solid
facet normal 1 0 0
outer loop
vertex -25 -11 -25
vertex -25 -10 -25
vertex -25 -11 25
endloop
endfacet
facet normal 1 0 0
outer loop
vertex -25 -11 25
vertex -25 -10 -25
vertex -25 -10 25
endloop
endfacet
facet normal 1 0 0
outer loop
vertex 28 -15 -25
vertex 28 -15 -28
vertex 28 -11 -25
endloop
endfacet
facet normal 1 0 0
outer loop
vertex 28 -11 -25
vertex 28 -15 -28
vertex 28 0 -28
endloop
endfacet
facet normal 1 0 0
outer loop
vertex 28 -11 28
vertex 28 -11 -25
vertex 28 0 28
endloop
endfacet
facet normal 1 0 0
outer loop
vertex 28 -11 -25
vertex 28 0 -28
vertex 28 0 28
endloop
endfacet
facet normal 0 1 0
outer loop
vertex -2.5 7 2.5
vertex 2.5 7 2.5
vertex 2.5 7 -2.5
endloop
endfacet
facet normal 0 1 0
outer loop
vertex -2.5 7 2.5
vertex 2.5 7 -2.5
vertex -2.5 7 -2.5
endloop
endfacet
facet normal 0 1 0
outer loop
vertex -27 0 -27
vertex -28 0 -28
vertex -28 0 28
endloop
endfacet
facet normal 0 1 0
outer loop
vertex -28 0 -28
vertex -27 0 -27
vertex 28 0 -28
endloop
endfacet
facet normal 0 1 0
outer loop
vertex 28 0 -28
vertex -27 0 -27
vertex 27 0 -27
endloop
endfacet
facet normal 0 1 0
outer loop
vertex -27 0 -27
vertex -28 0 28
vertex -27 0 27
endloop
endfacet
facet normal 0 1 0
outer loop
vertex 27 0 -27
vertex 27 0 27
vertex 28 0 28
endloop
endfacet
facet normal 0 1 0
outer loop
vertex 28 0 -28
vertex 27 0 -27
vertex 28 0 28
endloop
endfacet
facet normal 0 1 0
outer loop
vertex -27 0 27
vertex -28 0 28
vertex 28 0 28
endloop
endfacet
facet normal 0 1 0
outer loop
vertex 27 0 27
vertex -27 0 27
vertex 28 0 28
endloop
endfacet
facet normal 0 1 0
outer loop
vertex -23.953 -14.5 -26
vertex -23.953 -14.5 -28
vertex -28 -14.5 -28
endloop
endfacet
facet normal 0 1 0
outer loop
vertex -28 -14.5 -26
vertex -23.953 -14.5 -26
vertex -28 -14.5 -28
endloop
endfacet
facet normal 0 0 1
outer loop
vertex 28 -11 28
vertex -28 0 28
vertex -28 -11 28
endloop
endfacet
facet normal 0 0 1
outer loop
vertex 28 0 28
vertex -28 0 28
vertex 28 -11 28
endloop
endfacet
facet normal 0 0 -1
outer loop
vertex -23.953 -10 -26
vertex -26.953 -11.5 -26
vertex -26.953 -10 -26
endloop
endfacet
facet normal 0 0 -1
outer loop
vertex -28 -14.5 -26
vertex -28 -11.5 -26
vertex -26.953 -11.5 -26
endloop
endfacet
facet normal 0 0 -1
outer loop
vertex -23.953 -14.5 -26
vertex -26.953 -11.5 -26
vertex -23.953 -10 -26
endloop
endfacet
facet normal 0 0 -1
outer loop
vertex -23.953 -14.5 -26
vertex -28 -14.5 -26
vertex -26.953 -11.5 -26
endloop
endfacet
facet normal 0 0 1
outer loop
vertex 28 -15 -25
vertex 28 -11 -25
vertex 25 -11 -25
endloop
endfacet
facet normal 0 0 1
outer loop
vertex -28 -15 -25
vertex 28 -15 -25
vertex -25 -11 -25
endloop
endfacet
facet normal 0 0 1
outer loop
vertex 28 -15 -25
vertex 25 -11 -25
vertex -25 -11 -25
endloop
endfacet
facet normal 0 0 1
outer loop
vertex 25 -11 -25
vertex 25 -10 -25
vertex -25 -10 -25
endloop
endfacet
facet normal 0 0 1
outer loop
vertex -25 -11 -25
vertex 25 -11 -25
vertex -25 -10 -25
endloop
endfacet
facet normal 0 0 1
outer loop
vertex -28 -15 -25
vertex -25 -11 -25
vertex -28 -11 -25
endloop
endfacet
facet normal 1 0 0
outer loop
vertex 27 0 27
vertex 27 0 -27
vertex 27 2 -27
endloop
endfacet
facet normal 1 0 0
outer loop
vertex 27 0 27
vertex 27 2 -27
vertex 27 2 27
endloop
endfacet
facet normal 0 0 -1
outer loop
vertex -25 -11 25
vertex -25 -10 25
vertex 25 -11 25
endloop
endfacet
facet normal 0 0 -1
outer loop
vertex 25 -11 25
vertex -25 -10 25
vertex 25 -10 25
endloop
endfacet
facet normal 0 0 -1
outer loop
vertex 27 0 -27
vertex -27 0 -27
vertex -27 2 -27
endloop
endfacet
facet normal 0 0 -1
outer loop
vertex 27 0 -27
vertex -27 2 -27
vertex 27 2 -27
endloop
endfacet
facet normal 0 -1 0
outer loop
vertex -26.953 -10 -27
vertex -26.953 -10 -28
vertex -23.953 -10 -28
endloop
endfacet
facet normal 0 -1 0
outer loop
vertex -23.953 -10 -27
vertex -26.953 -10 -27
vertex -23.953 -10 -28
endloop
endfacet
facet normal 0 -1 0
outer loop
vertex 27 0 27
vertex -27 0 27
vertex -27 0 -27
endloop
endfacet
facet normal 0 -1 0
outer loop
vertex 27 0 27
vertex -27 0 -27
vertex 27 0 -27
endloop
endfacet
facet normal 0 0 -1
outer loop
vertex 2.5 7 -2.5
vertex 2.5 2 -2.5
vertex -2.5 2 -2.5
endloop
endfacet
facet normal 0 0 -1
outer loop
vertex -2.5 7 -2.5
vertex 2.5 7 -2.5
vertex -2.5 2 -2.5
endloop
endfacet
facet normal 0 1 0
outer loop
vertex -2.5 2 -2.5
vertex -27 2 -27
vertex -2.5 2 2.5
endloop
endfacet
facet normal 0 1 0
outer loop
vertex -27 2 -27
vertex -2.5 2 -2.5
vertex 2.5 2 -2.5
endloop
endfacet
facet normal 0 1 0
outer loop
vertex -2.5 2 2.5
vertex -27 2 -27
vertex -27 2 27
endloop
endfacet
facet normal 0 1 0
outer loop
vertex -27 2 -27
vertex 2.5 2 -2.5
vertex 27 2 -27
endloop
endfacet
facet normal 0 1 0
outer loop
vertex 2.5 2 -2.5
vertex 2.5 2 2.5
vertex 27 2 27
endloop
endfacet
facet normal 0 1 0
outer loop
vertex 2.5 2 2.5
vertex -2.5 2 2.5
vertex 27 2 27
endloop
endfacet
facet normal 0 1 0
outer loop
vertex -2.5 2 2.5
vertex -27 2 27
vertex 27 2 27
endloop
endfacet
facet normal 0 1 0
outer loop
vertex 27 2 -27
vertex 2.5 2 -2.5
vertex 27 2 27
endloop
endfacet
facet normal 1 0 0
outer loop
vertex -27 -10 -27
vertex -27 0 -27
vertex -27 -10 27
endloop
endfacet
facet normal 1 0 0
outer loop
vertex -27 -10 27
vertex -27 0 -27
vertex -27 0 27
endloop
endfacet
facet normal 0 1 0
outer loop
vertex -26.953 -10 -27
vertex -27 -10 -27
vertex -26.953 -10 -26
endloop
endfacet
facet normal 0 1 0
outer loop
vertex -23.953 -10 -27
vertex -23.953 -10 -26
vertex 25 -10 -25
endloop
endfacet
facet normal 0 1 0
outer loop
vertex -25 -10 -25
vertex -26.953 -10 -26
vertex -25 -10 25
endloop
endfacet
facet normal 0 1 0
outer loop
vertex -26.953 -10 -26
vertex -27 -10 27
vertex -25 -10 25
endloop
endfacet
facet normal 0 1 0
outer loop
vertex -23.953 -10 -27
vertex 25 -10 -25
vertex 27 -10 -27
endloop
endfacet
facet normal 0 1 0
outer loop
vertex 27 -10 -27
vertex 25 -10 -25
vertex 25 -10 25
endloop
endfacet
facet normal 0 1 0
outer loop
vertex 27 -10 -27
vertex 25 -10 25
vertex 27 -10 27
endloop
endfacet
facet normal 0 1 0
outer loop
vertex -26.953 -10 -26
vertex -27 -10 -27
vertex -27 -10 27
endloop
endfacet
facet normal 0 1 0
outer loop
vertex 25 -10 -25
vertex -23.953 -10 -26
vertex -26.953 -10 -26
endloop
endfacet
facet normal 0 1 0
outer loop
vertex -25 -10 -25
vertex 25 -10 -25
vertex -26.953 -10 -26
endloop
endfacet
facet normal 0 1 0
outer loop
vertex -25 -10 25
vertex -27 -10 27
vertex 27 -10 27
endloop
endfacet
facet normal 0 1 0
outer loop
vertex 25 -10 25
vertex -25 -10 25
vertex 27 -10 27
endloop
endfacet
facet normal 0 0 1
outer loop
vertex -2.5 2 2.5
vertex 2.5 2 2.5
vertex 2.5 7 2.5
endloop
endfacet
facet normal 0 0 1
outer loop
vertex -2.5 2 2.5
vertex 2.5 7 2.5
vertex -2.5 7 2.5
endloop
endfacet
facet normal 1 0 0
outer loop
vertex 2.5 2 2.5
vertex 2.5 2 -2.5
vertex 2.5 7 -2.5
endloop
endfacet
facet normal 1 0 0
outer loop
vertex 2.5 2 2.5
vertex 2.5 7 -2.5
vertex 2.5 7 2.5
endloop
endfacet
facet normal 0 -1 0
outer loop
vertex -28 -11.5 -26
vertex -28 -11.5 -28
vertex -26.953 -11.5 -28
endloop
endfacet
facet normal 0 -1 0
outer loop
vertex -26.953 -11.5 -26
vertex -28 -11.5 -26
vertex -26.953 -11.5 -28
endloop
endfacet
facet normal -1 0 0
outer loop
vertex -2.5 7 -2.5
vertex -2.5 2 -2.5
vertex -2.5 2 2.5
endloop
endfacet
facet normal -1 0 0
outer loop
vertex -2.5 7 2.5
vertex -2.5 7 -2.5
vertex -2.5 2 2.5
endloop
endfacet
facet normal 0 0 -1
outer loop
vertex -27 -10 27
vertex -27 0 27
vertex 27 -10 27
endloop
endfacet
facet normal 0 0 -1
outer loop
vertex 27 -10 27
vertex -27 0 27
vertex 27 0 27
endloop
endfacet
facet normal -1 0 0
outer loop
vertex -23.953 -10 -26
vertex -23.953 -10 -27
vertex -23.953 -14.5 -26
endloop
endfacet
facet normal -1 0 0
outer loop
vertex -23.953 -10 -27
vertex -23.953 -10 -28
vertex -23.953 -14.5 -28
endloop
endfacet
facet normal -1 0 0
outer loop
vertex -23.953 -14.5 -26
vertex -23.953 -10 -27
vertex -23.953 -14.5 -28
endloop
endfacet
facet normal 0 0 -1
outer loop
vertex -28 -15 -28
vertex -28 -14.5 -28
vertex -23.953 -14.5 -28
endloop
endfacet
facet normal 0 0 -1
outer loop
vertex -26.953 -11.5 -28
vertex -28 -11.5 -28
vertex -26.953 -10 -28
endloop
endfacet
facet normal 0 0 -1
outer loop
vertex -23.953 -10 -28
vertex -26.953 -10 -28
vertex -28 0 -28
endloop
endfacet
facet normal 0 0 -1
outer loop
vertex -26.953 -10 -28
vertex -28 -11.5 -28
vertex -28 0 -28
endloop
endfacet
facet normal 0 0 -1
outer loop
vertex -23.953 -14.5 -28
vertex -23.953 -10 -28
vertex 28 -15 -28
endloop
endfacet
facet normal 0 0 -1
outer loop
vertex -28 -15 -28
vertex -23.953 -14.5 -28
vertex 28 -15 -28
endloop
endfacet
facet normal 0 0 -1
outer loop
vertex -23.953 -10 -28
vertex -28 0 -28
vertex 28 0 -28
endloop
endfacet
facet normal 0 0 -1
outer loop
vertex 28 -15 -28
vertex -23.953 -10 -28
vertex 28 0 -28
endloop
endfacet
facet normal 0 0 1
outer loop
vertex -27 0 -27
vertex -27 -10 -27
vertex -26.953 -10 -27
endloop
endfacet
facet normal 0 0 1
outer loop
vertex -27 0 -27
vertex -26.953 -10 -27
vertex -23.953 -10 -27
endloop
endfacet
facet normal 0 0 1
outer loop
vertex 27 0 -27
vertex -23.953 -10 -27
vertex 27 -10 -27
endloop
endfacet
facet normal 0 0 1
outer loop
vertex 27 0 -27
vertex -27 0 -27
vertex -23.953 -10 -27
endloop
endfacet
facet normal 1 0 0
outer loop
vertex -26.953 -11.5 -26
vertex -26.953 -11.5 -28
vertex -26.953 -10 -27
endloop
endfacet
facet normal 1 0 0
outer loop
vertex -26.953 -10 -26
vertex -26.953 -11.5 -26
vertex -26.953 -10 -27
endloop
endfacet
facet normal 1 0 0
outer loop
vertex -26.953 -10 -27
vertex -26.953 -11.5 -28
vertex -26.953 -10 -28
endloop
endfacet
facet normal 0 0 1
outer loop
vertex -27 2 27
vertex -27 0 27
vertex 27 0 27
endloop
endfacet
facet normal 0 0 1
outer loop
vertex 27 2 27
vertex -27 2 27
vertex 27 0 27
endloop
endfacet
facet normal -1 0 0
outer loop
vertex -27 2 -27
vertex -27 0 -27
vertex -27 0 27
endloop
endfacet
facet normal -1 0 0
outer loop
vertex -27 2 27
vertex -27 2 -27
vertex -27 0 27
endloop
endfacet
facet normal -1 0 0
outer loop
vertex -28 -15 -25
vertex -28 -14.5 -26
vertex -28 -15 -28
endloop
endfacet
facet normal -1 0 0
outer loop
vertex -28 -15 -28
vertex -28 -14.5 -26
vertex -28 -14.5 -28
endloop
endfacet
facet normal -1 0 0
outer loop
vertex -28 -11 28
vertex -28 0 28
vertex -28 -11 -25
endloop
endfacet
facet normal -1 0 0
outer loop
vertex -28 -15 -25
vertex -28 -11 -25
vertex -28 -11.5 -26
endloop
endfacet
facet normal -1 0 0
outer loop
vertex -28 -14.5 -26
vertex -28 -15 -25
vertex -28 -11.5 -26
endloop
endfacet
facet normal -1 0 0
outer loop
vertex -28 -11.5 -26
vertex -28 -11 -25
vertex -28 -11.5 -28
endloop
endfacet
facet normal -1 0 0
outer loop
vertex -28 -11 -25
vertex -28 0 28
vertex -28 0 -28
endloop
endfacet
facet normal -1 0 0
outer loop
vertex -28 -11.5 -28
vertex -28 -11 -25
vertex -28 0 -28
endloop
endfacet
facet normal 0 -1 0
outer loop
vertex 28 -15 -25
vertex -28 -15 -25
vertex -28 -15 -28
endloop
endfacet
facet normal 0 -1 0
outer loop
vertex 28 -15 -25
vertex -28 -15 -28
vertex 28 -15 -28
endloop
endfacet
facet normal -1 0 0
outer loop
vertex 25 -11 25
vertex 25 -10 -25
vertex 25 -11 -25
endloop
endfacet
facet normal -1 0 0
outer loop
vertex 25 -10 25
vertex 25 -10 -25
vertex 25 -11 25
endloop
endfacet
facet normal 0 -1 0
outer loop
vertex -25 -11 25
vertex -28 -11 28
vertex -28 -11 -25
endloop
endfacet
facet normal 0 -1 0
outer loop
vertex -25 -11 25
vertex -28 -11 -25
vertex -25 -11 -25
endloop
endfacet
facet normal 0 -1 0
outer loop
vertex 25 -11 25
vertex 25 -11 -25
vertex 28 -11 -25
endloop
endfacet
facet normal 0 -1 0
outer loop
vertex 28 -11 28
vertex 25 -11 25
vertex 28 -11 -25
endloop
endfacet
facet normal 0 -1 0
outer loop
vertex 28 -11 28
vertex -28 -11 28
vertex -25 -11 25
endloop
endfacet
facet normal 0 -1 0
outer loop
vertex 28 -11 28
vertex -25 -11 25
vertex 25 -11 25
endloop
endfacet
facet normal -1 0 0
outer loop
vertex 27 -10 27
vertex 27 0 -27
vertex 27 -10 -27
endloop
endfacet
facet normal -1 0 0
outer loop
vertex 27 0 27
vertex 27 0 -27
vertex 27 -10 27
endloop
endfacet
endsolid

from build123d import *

# Parameters (mm, degrees)
F0_W      = 56
F0_H      = 56
F0_W_2    = 54
F0_H_2    = 54
F1_DEPTH  = 10
F2_W      = 56
F2_H      = 56
F2_W_2    = 54
F2_H_2    = 54
F2_W_3    = 50
F2_H_3    = 50
F3_DEPTH  = 1
F4_DEPTH  = 2
F5_W      = 5
F5_H      = 5
F6_DEPTH  = 5
F8_DEPTH  = 4
F10_DEPTH = 2


# Not quite as in the source:
# - a feature of the source that left no trace in its solid (it failed there, or was rolled back) is left out


with BuildPart() as f1:
    # F0 (on Front) → F1 (new body)
    with BuildSketch(Plane.XZ):
        Rectangle(F0_W, F0_H)
        Rectangle(F0_W_2, F0_H_2, mode=Mode.SUBTRACT)
    extrude(amount=F1_DEPTH)

    # F2 (on face) → F3 (join)
    with BuildSketch(Plane.XZ.offset(10)):
        Rectangle(F2_W, F2_H)
        Rectangle(F2_W_2, F2_H_2, mode=Mode.SUBTRACT)
        Rectangle(F2_W_2, F2_H_2)
        Rectangle(F2_W_3, F2_H_3, mode=Mode.SUBTRACT)
    extrude(amount=F3_DEPTH)

    # F7 (on face) → F8 (join)
    with BuildSketch(Plane.XZ.offset(11)):
        Polygon((-28, -25), (-28, -28), (28, -28), (28, -25), (25, -25), (-25, -25), align=None)
    extrude(amount=F8_DEPTH)

    # F9 (on face) → F10 (cut)
    with BuildSketch(Plane(origin=(0, 0, -28), x_dir=(1, 0, 0), z_dir=(0, 0, -1))):
        Polygon((-26.9533358514, 10), (-23.9533358514, 10), (-23.9533358514, 14.5), (-28, 14.5), (-28, 11.5), (-26.9533358514, 11.5), align=None)
    extrude(amount=-F10_DEPTH, mode=Mode.SUBTRACT)


with BuildPart() as f4:
    # F0 (on Front) → F4 (new body)
    with BuildSketch(Plane.XZ):
        Rectangle(F0_W_2, F0_H_2)
    extrude(amount=-F4_DEPTH)

    # F5 (on face) → F6 (join)
    with BuildSketch(Plane(origin=(0, 2, 0), x_dir=(-1, 0, 0), z_dir=(0, 1, 0))):
        Rectangle(F5_W, F5_H)
    extrude(amount=F6_DEPTH)


solid = Compound([f1.part, f4.part])
